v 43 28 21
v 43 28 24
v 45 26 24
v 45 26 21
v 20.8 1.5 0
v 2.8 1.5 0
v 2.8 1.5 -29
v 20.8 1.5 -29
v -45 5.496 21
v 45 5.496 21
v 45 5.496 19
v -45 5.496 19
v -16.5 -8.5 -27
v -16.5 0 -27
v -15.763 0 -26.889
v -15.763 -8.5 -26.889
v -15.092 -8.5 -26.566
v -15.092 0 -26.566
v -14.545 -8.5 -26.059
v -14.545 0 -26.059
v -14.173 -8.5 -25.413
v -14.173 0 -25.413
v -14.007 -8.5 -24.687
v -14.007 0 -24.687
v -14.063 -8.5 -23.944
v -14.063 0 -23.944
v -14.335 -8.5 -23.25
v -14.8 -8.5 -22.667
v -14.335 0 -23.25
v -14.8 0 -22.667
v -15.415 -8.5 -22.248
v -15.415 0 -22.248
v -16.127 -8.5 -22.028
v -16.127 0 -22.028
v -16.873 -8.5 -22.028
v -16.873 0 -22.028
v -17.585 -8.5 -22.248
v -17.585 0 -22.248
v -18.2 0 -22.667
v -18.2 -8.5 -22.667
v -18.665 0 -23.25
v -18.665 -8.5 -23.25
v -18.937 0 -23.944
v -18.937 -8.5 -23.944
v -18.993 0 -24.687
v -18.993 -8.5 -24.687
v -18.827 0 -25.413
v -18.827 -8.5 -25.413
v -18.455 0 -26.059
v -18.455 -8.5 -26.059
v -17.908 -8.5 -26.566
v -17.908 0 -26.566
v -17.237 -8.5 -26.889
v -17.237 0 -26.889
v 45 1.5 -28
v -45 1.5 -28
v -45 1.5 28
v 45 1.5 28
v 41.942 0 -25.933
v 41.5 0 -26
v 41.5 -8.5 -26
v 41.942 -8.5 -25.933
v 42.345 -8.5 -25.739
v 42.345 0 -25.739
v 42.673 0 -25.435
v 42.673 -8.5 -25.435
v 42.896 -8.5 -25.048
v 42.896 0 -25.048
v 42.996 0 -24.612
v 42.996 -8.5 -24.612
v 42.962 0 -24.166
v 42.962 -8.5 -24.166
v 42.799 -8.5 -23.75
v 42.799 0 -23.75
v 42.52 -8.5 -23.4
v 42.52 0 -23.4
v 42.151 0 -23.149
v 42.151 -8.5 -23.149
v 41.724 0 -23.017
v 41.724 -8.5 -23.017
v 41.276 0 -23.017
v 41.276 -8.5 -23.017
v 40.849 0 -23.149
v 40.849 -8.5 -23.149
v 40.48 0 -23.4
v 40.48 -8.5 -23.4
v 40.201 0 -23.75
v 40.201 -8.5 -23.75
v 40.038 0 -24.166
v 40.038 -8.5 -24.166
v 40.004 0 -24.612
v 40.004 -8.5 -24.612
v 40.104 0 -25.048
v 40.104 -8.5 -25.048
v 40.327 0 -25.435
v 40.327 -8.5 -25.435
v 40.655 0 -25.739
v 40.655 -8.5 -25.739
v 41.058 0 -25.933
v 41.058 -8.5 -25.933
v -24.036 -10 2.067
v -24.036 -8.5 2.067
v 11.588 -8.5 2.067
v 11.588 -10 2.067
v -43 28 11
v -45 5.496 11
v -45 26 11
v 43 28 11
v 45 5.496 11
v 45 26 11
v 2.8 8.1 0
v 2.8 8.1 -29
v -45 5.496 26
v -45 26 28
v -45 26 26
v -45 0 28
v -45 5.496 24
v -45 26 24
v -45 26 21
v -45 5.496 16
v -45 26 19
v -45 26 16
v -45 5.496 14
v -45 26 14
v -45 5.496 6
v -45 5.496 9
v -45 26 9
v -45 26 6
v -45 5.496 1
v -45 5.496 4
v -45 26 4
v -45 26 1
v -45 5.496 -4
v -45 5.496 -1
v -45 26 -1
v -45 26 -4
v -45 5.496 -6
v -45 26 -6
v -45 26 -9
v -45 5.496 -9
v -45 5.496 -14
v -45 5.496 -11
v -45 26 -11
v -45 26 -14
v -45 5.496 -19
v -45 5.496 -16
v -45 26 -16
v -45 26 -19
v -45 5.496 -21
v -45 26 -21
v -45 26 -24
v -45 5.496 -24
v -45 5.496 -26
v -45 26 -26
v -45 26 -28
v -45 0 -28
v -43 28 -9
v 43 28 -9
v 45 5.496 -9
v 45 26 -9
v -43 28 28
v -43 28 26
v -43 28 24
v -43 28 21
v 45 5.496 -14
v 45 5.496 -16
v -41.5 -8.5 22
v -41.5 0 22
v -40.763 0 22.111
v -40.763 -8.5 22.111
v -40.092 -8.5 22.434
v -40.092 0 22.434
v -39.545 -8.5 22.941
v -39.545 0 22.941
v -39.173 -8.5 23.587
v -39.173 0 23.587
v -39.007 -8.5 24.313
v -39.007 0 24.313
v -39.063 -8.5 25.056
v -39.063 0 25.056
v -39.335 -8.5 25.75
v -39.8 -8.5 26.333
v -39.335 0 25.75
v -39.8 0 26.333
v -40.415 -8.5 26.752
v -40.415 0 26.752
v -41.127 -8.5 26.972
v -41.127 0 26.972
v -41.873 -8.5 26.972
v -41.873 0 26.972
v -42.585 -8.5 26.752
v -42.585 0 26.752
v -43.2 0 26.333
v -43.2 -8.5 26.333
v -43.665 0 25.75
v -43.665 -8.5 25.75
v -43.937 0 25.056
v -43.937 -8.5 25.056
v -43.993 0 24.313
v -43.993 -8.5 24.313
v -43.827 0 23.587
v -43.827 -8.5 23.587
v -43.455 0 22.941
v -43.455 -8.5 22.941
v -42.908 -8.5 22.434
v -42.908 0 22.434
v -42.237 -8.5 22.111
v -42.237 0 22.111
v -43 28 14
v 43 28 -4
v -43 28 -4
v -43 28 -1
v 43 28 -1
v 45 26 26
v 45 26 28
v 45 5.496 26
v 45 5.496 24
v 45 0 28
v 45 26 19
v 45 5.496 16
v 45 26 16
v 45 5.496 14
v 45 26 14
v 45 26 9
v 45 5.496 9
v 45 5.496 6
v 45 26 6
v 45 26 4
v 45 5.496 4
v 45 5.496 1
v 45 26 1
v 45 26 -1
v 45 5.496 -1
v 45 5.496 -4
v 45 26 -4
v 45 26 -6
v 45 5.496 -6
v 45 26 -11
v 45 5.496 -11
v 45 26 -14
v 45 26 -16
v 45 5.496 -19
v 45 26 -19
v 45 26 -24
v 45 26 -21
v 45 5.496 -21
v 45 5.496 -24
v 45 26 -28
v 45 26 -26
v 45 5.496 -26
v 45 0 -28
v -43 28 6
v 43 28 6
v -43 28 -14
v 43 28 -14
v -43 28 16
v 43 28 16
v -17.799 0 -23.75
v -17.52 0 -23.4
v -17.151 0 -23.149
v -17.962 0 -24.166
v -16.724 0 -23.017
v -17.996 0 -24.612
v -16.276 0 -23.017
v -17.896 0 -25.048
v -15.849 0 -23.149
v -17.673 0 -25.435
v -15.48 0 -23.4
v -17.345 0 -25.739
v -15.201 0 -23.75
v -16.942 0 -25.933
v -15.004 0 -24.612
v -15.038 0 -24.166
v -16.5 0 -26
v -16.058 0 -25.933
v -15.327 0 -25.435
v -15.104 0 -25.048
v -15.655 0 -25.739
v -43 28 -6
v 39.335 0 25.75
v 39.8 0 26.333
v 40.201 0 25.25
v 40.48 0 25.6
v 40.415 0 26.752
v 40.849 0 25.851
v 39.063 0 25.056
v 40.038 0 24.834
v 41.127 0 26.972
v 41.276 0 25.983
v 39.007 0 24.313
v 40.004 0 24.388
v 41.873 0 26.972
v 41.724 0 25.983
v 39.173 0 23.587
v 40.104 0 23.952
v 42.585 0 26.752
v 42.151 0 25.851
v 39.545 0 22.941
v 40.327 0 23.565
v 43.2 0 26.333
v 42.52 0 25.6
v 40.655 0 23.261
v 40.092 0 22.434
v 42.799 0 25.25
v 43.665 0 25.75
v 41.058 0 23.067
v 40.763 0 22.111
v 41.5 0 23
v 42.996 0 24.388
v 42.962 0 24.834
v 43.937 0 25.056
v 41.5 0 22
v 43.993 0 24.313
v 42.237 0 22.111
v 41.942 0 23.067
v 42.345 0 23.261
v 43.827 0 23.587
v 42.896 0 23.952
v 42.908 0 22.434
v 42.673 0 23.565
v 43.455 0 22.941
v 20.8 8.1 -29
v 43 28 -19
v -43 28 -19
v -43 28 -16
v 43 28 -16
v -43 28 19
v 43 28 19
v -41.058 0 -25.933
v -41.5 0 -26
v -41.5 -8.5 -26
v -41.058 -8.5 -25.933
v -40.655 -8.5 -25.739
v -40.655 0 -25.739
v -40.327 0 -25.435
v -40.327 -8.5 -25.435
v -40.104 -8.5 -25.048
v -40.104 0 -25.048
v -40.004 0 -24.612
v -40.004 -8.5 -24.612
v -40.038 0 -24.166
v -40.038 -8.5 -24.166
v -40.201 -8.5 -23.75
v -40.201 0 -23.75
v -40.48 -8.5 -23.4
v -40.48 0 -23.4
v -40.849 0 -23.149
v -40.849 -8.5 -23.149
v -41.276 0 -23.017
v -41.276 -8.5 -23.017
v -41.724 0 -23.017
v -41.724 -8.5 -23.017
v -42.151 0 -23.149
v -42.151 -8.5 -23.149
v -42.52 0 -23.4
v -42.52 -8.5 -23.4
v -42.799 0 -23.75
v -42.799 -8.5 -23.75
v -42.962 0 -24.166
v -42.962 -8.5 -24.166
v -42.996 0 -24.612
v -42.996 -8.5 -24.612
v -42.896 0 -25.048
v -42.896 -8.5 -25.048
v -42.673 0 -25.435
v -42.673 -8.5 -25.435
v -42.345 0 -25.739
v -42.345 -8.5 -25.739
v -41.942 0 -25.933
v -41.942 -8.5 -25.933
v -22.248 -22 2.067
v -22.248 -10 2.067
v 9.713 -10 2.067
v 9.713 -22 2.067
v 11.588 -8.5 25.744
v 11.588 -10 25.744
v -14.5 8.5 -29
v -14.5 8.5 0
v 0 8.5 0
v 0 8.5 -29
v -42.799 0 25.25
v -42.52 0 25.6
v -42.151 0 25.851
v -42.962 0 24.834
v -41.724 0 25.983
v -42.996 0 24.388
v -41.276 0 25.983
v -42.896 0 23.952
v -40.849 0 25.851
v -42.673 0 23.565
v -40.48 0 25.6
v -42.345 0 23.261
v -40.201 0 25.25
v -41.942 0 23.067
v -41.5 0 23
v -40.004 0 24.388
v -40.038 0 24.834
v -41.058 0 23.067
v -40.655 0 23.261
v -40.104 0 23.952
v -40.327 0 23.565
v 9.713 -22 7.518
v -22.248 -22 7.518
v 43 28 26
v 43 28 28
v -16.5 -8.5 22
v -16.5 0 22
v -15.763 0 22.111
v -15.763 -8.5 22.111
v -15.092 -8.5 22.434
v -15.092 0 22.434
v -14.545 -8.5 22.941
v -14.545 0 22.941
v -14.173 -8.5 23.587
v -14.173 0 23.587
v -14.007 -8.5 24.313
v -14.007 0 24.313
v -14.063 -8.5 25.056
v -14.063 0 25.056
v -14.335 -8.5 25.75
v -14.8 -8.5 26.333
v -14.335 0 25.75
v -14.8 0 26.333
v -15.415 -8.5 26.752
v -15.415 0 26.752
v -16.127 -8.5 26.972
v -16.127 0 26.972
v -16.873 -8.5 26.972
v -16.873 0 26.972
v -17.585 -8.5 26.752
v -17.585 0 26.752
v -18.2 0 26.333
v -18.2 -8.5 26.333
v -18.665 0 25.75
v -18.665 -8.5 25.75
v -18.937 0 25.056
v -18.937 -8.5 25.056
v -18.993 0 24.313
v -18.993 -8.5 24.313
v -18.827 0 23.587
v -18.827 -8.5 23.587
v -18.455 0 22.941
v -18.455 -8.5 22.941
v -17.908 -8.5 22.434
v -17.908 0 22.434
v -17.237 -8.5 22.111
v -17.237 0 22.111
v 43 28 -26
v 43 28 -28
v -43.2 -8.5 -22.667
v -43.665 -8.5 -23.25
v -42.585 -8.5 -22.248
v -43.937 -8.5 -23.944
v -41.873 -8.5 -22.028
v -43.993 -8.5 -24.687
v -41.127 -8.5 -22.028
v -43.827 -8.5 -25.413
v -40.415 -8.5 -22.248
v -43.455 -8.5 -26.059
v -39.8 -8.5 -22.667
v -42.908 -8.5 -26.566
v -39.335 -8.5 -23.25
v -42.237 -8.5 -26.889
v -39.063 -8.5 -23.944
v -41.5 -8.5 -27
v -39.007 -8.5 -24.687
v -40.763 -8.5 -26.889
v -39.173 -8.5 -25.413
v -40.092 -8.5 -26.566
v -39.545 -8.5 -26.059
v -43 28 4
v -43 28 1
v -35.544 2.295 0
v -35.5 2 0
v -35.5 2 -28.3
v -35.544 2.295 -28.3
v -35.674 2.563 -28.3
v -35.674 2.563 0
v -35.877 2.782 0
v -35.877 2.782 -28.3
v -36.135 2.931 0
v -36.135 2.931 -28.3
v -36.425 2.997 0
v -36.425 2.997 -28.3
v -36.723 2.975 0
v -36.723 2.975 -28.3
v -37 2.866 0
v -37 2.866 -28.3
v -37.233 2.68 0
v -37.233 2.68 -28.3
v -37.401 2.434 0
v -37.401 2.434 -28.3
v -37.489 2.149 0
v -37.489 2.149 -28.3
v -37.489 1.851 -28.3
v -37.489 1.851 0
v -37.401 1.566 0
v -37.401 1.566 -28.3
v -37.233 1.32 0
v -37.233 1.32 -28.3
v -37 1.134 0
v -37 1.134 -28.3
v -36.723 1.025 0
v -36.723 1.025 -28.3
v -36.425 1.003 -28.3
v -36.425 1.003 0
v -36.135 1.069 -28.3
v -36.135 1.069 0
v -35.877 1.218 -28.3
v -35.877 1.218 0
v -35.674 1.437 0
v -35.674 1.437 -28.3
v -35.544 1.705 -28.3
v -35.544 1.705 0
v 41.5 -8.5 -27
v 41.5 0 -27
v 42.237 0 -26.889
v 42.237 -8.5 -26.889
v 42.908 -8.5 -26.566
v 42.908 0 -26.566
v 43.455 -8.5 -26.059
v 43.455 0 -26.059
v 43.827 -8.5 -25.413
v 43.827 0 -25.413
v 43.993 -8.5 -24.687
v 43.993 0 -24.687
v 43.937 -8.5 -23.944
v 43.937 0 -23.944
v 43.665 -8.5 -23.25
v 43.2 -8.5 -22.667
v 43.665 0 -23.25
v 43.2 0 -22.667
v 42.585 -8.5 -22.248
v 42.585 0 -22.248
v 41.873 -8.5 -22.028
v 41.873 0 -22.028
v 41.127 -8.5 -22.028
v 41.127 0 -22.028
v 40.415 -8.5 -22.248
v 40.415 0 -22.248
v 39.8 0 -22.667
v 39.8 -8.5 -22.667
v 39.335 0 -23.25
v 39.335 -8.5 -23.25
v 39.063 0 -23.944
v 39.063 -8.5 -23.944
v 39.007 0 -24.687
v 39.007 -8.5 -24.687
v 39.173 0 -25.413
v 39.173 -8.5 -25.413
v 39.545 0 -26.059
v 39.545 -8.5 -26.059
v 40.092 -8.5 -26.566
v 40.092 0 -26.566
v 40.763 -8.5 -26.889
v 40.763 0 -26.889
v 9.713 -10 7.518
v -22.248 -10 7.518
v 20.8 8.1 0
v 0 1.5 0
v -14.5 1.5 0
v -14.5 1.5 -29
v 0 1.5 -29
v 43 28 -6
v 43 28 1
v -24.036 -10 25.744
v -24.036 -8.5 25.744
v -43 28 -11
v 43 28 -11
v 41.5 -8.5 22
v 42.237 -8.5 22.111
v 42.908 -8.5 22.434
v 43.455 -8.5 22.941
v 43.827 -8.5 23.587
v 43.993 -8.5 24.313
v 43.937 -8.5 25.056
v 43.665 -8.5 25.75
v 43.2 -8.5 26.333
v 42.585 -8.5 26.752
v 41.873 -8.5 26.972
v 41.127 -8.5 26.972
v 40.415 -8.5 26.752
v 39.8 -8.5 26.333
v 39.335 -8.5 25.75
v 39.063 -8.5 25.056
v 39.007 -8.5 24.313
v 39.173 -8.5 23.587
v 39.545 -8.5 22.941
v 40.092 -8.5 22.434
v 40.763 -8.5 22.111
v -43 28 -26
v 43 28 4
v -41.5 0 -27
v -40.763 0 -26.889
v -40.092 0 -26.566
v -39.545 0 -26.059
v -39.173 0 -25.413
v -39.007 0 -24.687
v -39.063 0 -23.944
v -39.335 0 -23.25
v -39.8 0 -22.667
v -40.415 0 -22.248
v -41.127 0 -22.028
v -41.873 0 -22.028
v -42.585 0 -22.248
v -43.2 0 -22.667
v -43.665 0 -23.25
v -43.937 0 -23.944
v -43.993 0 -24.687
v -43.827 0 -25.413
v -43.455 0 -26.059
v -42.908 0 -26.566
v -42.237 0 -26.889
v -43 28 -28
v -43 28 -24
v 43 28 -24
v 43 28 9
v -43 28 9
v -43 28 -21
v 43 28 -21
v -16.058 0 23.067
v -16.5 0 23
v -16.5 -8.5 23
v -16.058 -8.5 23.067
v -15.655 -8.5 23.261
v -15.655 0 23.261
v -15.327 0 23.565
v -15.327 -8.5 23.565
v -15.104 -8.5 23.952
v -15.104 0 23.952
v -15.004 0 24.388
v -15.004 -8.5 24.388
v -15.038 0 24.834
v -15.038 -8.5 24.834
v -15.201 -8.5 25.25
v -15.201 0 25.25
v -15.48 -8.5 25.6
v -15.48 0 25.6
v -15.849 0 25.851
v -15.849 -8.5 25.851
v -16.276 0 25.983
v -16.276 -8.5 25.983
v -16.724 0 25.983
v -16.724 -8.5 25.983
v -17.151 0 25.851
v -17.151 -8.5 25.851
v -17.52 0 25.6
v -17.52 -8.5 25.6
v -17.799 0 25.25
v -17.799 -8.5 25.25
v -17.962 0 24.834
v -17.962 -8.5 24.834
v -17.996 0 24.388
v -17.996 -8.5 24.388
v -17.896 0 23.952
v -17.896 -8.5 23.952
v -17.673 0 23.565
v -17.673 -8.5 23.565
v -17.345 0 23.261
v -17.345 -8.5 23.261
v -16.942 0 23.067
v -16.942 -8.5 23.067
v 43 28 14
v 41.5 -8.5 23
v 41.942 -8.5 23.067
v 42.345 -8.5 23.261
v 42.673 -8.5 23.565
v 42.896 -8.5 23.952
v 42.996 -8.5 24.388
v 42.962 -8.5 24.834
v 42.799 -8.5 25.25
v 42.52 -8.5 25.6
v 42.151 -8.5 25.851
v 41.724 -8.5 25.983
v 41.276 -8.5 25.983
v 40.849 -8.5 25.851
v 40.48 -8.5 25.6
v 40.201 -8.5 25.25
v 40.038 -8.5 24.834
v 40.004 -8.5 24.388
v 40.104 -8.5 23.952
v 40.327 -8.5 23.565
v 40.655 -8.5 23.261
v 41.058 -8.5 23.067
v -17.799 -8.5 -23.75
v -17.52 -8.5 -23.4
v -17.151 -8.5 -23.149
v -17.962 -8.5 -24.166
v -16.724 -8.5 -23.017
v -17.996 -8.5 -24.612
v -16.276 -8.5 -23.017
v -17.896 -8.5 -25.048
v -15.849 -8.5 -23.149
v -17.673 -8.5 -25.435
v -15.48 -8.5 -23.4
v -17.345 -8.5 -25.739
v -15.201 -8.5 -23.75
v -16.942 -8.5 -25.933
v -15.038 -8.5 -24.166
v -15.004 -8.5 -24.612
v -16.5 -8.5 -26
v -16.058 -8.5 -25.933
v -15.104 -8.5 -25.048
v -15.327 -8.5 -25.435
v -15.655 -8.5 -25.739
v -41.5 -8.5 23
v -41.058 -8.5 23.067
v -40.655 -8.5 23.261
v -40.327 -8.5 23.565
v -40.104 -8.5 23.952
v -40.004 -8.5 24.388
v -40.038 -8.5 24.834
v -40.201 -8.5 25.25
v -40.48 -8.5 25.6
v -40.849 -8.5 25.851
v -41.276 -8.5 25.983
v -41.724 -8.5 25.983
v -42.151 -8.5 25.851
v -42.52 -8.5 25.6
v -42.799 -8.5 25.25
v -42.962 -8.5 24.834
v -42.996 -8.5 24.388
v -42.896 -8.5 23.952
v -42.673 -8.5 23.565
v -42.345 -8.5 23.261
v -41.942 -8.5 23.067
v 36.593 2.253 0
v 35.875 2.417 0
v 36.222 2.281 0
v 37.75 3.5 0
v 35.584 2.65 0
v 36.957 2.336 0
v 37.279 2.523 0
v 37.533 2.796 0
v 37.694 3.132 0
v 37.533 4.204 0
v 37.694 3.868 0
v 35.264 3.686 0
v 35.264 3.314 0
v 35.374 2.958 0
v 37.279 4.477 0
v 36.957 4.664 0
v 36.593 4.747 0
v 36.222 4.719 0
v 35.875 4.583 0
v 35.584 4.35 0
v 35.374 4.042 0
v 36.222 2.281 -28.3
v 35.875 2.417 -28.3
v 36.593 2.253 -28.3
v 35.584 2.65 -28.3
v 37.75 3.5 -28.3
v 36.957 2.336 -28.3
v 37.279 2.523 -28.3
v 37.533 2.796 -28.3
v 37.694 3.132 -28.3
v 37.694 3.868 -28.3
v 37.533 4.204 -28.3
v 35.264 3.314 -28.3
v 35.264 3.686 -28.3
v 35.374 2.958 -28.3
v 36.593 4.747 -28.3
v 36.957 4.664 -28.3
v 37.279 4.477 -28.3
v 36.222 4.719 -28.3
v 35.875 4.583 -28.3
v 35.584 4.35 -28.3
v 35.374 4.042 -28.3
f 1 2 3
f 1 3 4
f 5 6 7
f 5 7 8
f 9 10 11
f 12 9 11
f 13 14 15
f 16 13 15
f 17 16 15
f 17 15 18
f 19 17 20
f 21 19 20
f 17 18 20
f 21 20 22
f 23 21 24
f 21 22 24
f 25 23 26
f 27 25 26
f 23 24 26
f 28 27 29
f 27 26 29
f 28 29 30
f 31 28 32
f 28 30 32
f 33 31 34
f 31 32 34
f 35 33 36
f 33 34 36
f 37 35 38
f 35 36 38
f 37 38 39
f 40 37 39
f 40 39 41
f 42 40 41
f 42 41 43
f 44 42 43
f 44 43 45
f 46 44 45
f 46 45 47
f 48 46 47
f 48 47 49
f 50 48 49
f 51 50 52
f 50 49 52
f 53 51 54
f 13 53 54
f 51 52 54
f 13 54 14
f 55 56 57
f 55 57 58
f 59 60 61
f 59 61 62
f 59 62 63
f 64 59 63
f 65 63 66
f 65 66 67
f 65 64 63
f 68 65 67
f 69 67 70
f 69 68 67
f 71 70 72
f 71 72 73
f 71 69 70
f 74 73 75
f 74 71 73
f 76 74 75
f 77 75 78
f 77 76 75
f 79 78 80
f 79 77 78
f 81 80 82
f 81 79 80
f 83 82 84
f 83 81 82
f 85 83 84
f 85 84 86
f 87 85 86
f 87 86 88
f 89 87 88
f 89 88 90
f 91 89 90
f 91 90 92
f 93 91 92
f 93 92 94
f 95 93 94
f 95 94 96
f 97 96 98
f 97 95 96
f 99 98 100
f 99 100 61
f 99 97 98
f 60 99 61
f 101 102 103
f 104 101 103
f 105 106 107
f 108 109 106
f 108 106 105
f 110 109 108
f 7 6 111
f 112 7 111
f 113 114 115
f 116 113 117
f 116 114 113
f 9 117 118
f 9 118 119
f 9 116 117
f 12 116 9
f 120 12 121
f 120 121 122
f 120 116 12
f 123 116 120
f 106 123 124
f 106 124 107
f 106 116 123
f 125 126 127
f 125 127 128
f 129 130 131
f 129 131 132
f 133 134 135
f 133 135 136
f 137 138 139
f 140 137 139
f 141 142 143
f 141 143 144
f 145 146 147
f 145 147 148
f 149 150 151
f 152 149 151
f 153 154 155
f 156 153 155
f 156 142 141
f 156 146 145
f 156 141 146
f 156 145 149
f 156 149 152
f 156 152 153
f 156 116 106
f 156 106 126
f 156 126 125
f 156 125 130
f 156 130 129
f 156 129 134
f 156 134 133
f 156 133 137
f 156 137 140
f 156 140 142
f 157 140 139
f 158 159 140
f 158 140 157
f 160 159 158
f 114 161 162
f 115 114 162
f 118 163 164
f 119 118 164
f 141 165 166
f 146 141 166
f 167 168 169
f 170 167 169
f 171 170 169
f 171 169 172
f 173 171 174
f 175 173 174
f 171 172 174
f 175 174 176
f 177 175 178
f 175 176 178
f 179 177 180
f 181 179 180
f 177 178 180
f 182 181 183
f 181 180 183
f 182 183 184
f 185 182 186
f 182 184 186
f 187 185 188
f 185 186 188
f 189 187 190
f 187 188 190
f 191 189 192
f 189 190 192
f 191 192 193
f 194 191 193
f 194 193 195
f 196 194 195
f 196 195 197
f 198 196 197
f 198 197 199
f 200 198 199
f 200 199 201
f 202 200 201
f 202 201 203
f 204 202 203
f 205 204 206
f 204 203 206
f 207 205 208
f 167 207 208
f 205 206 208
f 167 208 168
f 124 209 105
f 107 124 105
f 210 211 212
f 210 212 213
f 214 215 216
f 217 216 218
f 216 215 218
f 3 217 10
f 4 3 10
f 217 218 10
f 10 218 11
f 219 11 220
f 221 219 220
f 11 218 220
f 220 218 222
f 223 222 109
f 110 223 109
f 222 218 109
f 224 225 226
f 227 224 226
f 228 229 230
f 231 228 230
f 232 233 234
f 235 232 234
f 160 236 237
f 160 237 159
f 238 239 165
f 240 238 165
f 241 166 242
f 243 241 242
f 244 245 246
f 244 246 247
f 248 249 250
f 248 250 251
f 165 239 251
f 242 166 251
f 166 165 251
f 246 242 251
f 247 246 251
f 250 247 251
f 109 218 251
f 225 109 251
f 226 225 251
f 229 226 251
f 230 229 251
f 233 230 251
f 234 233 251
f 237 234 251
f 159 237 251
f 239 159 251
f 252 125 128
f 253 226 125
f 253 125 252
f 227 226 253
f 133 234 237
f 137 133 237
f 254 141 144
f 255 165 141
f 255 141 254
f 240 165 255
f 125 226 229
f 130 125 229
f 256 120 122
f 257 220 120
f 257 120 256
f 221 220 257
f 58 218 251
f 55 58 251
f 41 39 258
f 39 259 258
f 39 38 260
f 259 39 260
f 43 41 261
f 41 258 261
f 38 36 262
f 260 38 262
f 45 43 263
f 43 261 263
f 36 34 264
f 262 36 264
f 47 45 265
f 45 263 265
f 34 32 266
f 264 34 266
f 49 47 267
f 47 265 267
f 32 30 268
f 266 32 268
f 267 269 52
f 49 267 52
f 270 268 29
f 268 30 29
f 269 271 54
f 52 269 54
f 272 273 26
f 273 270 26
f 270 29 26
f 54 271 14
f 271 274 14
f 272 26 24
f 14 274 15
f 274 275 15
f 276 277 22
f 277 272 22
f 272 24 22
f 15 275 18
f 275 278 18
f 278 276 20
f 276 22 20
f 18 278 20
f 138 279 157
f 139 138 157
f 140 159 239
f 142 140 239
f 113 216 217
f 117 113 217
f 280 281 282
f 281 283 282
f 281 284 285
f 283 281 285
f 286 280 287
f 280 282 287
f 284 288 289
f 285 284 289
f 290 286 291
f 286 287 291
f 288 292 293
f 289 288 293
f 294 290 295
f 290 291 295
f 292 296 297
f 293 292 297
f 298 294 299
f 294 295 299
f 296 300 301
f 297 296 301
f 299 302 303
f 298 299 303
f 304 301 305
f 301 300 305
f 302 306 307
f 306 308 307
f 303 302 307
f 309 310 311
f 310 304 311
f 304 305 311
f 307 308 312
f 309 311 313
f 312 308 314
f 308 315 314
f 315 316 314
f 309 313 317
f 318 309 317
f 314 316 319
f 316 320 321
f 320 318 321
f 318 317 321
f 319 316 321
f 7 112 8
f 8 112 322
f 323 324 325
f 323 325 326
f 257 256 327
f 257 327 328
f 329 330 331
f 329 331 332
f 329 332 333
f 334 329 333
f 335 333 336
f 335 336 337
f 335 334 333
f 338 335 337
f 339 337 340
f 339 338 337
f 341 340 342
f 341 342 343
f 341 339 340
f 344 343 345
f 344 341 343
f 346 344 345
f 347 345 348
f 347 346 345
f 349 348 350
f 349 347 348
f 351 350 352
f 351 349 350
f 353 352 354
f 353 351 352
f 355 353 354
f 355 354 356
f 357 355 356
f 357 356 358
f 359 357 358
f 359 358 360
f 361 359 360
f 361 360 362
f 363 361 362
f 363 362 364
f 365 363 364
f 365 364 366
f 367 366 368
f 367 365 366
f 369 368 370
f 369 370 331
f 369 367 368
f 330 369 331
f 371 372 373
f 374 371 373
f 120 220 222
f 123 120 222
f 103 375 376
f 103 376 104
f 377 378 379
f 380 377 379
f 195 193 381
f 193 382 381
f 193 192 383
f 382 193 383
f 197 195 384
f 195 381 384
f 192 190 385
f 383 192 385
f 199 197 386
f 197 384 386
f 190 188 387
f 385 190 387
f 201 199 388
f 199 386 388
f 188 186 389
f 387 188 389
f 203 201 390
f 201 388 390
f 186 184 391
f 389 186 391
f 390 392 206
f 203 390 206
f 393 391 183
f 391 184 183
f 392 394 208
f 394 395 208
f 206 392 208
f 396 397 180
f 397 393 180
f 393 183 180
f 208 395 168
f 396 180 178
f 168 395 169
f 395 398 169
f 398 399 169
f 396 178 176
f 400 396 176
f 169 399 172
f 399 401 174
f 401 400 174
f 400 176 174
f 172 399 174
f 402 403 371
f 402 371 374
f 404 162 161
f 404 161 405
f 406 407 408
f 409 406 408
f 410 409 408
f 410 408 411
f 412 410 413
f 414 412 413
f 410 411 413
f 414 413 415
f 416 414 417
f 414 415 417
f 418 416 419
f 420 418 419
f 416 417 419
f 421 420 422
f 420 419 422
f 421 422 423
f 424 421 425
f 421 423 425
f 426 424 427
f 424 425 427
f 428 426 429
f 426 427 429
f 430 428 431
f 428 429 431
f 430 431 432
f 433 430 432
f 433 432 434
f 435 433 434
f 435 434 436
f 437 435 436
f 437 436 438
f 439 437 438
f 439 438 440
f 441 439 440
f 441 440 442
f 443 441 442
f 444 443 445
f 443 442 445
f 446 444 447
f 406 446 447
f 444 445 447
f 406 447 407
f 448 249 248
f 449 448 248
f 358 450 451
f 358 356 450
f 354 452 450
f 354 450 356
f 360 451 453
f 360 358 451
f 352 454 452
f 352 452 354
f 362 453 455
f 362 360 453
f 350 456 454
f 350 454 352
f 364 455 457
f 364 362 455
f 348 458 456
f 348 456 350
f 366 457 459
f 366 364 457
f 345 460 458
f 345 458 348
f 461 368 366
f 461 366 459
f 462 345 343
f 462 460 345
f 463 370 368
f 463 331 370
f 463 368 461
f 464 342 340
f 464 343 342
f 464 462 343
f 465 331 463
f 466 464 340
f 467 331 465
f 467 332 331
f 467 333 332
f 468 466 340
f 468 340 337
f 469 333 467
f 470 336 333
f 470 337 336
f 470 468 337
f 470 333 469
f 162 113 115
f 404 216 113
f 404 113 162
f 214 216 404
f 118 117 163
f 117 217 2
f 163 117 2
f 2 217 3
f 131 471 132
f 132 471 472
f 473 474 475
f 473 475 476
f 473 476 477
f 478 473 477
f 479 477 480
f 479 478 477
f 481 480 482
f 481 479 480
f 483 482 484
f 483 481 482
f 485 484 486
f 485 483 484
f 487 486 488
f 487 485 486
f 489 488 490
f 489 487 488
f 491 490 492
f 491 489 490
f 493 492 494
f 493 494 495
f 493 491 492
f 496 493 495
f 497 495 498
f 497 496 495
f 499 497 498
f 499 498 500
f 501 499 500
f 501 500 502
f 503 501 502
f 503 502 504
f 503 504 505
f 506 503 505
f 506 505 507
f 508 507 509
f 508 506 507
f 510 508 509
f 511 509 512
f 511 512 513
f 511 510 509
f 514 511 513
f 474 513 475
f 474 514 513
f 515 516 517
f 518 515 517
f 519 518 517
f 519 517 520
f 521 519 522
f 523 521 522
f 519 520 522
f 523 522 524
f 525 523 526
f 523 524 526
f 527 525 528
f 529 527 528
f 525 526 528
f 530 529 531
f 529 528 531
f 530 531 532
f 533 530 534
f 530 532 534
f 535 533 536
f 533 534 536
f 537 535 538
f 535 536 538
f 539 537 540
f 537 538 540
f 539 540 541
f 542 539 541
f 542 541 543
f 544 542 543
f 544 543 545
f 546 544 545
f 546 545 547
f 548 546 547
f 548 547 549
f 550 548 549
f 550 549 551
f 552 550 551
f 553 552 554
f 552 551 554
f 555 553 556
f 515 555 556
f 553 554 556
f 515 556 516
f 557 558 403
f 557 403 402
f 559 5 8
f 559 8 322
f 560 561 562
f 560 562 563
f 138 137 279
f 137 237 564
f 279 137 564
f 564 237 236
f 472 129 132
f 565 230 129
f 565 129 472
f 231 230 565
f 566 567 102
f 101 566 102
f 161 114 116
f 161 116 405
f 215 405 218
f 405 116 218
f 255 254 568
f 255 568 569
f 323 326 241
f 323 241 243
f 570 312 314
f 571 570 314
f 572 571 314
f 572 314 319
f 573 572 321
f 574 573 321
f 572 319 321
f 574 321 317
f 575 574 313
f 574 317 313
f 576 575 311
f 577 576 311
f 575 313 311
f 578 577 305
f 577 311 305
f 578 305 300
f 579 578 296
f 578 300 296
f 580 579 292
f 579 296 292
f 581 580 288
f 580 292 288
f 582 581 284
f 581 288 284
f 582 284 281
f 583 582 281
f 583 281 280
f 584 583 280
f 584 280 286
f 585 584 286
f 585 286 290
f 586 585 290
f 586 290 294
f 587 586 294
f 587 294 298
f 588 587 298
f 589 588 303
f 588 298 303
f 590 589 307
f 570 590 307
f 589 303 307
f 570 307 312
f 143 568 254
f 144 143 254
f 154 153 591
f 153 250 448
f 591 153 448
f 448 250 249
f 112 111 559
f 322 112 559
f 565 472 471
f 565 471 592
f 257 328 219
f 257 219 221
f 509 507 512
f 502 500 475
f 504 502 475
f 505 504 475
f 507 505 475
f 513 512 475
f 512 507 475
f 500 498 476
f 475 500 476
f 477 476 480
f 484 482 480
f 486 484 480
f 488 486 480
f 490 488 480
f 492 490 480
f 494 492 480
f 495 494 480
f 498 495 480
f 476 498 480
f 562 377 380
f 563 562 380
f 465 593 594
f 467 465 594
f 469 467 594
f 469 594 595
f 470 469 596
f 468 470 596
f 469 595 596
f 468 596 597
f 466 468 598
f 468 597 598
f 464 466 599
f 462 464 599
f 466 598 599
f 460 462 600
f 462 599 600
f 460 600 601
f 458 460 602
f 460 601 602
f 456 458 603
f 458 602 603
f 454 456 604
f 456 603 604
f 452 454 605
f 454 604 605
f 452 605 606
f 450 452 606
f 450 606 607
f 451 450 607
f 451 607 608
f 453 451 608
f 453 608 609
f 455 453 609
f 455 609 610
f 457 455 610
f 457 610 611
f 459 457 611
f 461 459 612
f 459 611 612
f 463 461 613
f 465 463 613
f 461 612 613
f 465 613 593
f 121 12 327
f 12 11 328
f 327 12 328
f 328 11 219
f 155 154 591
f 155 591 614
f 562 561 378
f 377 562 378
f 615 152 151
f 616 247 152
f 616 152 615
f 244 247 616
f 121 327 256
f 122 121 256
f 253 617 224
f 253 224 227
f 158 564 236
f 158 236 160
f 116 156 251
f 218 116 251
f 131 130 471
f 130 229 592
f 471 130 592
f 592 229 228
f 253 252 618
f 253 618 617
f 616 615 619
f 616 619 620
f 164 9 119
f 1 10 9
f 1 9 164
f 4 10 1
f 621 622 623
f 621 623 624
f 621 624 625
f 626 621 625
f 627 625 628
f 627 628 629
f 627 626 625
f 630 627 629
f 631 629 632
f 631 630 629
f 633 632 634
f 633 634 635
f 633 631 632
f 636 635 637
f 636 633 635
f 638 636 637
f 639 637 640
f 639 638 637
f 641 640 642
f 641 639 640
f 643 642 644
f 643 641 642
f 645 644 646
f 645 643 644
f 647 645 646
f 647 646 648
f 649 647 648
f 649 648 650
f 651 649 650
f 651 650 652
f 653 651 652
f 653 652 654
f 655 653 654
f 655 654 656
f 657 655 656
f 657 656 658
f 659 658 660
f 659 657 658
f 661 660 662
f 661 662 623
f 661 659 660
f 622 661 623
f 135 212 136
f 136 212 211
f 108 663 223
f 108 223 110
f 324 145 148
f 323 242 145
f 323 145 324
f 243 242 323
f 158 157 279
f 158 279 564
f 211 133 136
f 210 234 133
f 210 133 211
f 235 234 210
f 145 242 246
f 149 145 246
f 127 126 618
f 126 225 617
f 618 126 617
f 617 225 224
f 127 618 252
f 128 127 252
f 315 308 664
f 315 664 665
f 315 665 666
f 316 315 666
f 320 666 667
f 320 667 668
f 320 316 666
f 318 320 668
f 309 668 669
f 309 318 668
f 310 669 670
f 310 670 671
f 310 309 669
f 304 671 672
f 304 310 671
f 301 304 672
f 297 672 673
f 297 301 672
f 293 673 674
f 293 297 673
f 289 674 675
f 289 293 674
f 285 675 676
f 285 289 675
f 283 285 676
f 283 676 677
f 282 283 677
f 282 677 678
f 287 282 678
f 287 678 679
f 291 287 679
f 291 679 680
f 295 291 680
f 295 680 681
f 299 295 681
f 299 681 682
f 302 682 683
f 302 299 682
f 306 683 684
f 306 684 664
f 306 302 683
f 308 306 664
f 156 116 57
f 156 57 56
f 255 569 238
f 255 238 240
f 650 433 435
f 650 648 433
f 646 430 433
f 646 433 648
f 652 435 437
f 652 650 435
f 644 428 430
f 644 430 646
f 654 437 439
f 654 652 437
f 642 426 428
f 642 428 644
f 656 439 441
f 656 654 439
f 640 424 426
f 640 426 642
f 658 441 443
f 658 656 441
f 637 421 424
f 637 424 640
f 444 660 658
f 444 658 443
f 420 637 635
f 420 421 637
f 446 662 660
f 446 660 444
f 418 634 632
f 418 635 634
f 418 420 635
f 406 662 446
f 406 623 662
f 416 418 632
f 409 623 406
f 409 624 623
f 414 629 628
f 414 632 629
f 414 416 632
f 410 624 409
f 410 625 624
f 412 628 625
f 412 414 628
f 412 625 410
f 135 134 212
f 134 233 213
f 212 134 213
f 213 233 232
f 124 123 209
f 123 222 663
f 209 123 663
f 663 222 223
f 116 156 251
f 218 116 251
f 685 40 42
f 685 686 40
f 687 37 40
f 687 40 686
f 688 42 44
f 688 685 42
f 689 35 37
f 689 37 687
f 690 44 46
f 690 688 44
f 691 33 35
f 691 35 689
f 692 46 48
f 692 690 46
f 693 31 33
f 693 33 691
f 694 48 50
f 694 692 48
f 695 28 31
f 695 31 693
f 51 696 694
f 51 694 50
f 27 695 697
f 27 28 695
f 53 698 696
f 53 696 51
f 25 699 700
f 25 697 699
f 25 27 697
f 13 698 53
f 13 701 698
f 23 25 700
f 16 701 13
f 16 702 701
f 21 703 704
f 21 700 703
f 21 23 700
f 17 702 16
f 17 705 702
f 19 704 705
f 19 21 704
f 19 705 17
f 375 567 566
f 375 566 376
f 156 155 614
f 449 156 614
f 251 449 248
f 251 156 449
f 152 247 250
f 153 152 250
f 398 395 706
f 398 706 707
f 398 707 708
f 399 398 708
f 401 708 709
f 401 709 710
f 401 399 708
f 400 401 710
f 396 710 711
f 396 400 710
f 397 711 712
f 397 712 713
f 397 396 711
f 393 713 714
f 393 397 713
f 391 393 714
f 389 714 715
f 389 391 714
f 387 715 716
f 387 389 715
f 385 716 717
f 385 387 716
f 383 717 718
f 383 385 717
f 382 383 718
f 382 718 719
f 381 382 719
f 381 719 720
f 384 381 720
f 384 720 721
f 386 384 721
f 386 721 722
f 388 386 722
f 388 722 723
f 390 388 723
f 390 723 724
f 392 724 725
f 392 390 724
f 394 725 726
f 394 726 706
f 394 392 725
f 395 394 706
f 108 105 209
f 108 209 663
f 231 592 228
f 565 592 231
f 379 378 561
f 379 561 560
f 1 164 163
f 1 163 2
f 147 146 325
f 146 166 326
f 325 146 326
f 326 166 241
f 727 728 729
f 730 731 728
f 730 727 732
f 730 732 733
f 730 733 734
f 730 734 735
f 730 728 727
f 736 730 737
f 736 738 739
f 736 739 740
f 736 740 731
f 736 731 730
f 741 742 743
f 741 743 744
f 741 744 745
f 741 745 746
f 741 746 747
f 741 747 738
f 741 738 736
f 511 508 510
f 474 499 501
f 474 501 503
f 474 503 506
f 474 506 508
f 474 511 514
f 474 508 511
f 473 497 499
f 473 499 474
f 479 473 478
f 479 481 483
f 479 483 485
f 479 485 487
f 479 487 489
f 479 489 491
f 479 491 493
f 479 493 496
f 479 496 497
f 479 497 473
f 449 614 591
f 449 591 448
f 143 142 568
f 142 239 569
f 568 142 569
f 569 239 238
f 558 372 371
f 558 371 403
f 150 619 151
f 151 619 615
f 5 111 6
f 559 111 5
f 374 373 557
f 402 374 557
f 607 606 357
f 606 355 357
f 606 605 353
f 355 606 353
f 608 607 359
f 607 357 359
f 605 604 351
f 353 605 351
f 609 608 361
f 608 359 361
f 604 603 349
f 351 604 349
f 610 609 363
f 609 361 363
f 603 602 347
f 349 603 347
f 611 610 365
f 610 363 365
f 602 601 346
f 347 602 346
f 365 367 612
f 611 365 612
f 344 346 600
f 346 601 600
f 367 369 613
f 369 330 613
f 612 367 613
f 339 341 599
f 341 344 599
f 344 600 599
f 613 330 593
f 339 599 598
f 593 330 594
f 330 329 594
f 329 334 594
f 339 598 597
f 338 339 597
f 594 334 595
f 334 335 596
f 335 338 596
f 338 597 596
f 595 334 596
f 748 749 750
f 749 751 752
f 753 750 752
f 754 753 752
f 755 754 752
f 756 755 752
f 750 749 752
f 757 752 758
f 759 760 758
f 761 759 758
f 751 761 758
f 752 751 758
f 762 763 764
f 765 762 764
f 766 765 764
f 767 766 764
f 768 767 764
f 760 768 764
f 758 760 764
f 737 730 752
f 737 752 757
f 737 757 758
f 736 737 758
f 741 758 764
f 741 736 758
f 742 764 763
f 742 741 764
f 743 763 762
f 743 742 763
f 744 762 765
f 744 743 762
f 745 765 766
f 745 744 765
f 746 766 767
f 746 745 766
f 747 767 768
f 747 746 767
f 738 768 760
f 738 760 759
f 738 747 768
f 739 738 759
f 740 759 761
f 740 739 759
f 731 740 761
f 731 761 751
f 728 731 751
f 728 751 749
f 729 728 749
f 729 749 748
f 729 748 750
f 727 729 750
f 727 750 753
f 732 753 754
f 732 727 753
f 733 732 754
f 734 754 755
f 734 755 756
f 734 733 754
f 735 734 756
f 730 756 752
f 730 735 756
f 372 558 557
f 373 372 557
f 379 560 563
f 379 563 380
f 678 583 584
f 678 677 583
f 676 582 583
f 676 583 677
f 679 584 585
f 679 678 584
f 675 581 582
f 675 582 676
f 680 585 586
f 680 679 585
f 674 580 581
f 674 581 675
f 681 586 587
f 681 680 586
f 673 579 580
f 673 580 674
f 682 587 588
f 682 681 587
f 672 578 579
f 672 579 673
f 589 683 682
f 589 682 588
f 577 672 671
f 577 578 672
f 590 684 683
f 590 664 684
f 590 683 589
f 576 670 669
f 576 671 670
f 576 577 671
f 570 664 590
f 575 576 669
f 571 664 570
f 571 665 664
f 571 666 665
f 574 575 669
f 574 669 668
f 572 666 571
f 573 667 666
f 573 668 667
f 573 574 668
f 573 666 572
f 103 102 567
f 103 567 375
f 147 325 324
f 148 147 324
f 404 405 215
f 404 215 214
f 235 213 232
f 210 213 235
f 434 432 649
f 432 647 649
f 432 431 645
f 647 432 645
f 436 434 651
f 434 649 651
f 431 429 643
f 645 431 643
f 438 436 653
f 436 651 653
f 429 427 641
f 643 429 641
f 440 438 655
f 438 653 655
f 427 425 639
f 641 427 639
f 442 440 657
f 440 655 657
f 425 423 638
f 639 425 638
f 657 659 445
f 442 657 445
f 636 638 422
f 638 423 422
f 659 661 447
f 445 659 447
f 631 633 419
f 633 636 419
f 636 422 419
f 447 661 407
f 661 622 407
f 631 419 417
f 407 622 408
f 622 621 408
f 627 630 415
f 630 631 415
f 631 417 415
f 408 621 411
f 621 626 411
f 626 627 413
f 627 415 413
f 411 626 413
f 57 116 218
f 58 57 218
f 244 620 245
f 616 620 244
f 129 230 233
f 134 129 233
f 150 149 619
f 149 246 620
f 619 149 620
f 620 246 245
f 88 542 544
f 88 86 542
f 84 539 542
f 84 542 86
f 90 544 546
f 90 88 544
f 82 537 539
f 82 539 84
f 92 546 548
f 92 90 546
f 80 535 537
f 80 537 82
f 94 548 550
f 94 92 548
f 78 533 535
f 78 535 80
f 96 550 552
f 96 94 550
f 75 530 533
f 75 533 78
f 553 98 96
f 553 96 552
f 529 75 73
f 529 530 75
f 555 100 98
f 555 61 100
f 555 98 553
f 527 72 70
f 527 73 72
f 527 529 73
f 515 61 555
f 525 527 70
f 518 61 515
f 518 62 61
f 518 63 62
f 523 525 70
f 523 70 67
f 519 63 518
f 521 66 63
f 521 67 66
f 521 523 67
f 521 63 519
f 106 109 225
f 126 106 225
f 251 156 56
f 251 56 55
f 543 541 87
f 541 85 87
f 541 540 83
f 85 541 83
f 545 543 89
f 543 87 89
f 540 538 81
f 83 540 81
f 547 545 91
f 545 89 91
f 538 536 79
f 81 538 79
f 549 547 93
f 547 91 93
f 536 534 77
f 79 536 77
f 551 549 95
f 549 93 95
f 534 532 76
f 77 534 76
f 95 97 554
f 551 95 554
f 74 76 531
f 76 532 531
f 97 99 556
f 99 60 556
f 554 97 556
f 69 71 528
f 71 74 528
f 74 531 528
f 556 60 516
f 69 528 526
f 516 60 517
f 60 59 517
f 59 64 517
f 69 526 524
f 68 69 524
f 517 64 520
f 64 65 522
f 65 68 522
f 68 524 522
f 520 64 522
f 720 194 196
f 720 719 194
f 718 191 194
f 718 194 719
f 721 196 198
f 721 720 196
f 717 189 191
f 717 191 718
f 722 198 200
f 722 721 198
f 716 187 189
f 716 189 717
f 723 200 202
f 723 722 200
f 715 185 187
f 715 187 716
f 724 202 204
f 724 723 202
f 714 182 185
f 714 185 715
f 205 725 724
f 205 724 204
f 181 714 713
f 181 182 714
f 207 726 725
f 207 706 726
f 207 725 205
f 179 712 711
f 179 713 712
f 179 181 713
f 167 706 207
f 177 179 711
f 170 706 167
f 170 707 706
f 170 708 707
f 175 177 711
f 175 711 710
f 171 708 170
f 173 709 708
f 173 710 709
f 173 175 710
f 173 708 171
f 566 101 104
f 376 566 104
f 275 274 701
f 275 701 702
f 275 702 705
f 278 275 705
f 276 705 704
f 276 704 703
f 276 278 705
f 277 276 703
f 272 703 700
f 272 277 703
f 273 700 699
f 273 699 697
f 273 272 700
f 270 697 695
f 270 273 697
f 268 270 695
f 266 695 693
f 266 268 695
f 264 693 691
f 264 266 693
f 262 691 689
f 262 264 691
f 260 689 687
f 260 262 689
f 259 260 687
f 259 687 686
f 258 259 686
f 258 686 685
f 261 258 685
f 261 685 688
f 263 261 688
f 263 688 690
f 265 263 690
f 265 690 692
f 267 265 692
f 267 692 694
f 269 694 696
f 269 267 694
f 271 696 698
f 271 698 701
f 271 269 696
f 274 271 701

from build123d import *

# Parameters (mm, degrees)
SKETCH1_W             = 90
SKETCH1_H             = 56
BOSS_EXTRUDE1_DEPTH   = 1.5
SKETCH2_W             = 90
SKETCH2_H             = 56
BOSS_EXTRUDE2_DEPTH   = 28
CHAMFER1_SIZE         = 2
SKETCH3_W             = 2
SKETCH3_H             = 22.503636092
CUT_EXTRUDE1_DEPTH    = 60.941638283
LPATTERN1_COUNT       = 11
LPATTERN1_PITCH       = 5
SKETCH4_R             = 2.5
SKETCH4_R_2           = 1.5
BOSS_EXTRUDE3_DEPTH   = 8.5
BOSS_EXTRUDE3_2_DEPTH = 8.5
BOSS_EXTRUDE3_3_DEPTH = 8.5
BOSS_EXTRUDE3_4_DEPTH = 8.5
BOSS_EXTRUDE3_5_DEPTH = 8.5
BOSS_EXTRUDE3_6_DEPTH = 8.5
BOSS_EXTRUDE4_START   = -8.5
SKETCH6_W             = 35.624221149
SKETCH6_H             = 23.676807936
BOSS_EXTRUDE4_DEPTH   = 1.5
SKETCH7_W             = 31.961510529
SKETCH7_H             = 5.450462232
BOSS_EXTRUDE5_DEPTH   = 12
SKETCH5_W             = 14.5
SKETCH5_H             = 7
BOSS_EXTRUDE6_DEPTH   = 29
SKETCH5_W_2           = 18
SKETCH5_H_2           = 6.6
BOSS_EXTRUDE6_2_DEPTH = 29
SKETCH9_R             = 1.25
BOSS_EXTRUDE7_DEPTH   = 28.3
SKETCH9_R_2           = 1
BOSS_EXTRUDE7_2_DEPTH = 28.3


with BuildPart() as part:
    # Sketch1 → Boss-Extrude1 (new body)
    with BuildSketch(Plane(origin=(0, 0, 0), x_dir=(1, 0, 0), z_dir=(0, 1, 0))):
        Rectangle(SKETCH1_W, SKETCH1_H)
    extrude(amount=BOSS_EXTRUDE1_DEPTH)


with BuildPart() as body_2:
    # Sketch2 → Boss-Extrude2 (new body)
    with BuildSketch(Plane(origin=(0, 0, 0), x_dir=(1, 0, 0), z_dir=(0, 1, 0))):
        Rectangle(SKETCH2_W, SKETCH2_H)
    extrude(amount=BOSS_EXTRUDE2_DEPTH)

    # Chamfer1
    chamfer1_edges = [body_2.edges().sort_by_distance(p)[0] for p in [
        (45, 28, 0),
        (-45, 28, 0),
    ]]
    chamfer(chamfer1_edges, length=CHAMFER1_SIZE)

    # Sketch3 → Cut-Extrude1 (cut, symmetric)
    with BuildSketch(Plane(origin=(0, 0, 0), x_dir=(0, 0, -1), z_dir=(1, 0, 0))):
        with Locations((-25, 16.748181954)):
            Rectangle(SKETCH3_W, SKETCH3_H)
    cut_extrude1 = extrude(amount=CUT_EXTRUDE1_DEPTH, both=True, mode=Mode.SUBTRACT)

    # LPattern1: Cut-Extrude1 ×11
    with Locations(*[(0, 0, -i * LPATTERN1_PITCH) for i in range(1, LPATTERN1_COUNT)]):
        add(cut_extrude1, mode=Mode.SUBTRACT)


with BuildPart() as body_3:
    # Sketch4 → Boss-Extrude3 (new body)
    with BuildSketch(Plane.XZ):
        with Locations(Location((-41.5, 24.5, 0), (0, 0, 270))):
            Circle(SKETCH4_R)
        with Locations(Location((-41.5, 24.5, 0), (0, 0, 270))):
            Circle(SKETCH4_R_2, mode=Mode.SUBTRACT)
    extrude(amount=BOSS_EXTRUDE3_DEPTH)


with BuildPart() as body_4:
    # Sketch4 → Boss-Extrude3 2 (new body)
    with BuildSketch(Plane.XZ):
        with Locations(Location((-16.5, 24.5, 0), (0, 0, 270))):
            Circle(SKETCH4_R)
        with Locations(Location((-16.5, 24.5, 0), (0, 0, 270))):
            Circle(SKETCH4_R_2, mode=Mode.SUBTRACT)
    extrude(amount=BOSS_EXTRUDE3_2_DEPTH)


with BuildPart() as body_5:
    # Sketch4 → Boss-Extrude3 3 (new body)
    with BuildSketch(Plane.XZ):
        with Locations(Location((41.5, 24.5, 0), (0, 0, 270))):
            Circle(SKETCH4_R)
        with Locations(Location((41.5, 24.5, 0), (0, 0, 270))):
            Circle(SKETCH4_R_2, mode=Mode.SUBTRACT)
    extrude(amount=BOSS_EXTRUDE3_3_DEPTH)


with BuildPart() as body_6:
    # Sketch4 → Boss-Extrude3 4 (new body)
    with BuildSketch(Plane.XZ):
        with Locations(Location((-41.5, -24.5, 0), (0, 0, 270))):
            Circle(SKETCH4_R)
        with Locations(Location((-41.5, -24.5, 0), (0, 0, 270))):
            Circle(SKETCH4_R_2, mode=Mode.SUBTRACT)
    extrude(amount=BOSS_EXTRUDE3_4_DEPTH)


with BuildPart() as body_7:
    # Sketch4 → Boss-Extrude3 5 (new body)
    with BuildSketch(Plane.XZ):
        with Locations(Location((-16.5, -24.5, 0), (0, 0, 270))):
            Circle(SKETCH4_R)
        with Locations(Location((-16.5, -24.5, 0), (0, 0, 270))):
            Circle(SKETCH4_R_2, mode=Mode.SUBTRACT)
    extrude(amount=BOSS_EXTRUDE3_5_DEPTH)


with BuildPart() as body_8:
    # Sketch4 → Boss-Extrude3 6 (new body)
    with BuildSketch(Plane.XZ):
        with Locations(Location((41.5, -24.5, 0), (0, 0, 270))):
            Circle(SKETCH4_R)
        with Locations(Location((41.5, -24.5, 0), (0, 0, 270))):
            Circle(SKETCH4_R_2, mode=Mode.SUBTRACT)
    extrude(amount=BOSS_EXTRUDE3_6_DEPTH)


with BuildPart() as body_9:
    # Sketch6 → Boss-Extrude4 (new body)
    with BuildSketch(Plane(origin=(0, 0, 0), x_dir=(1, 0, 0), z_dir=(0, 1, 0)).offset(BOSS_EXTRUDE4_START)):
        with Locations((-6.223720435, -13.905640845)):
            Rectangle(SKETCH6_W, SKETCH6_H)
    extrude(amount=-BOSS_EXTRUDE4_DEPTH)


with BuildPart() as body_10:
    # Sketch7 → Boss-Extrude5 (new body)
    with BuildSketch(Plane.XZ.offset(10)):
        with Locations((-6.267324133, 4.792467993)):
            Rectangle(SKETCH7_W, SKETCH7_H)
    extrude(amount=BOSS_EXTRUDE5_DEPTH)


with BuildPart() as body_11:
    # Sketch5 → Boss-Extrude6 (new body)
    with BuildSketch(Plane.XY):
        with Locations((-7.25, 5)):
            Rectangle(SKETCH5_W, SKETCH5_H)
    extrude(amount=-BOSS_EXTRUDE6_DEPTH)


with BuildPart() as body_12:
    # Sketch5 → Boss-Extrude6 2 (new body)
    with BuildSketch(Plane.XY):
        with Locations((11.8, 4.8)):
            Rectangle(SKETCH5_W_2, SKETCH5_H_2)
    extrude(amount=-BOSS_EXTRUDE6_2_DEPTH)


with BuildPart() as body_13:
    # Sketch9 → Boss-Extrude7 (new body)
    with BuildSketch(Plane.XY):
        with Locations((36.5, 3.5)):
            Circle(SKETCH9_R)
    extrude(amount=-BOSS_EXTRUDE7_DEPTH)


with BuildPart() as body_14:
    # Sketch9 → Boss-Extrude7 2 (new body)
    with BuildSketch(Plane.XY):
        with Locations((-36.5, 2)):
            Circle(SKETCH9_R_2)
    extrude(amount=-BOSS_EXTRUDE7_2_DEPTH)


solid = Compound([part.part, body_2.part, body_3.part, body_4.part, body_5.part, body_6.part, body_7.part, body_8.part, body_9.part, body_10.part, body_11.part, body_12.part, body_13.part, body_14.part])
